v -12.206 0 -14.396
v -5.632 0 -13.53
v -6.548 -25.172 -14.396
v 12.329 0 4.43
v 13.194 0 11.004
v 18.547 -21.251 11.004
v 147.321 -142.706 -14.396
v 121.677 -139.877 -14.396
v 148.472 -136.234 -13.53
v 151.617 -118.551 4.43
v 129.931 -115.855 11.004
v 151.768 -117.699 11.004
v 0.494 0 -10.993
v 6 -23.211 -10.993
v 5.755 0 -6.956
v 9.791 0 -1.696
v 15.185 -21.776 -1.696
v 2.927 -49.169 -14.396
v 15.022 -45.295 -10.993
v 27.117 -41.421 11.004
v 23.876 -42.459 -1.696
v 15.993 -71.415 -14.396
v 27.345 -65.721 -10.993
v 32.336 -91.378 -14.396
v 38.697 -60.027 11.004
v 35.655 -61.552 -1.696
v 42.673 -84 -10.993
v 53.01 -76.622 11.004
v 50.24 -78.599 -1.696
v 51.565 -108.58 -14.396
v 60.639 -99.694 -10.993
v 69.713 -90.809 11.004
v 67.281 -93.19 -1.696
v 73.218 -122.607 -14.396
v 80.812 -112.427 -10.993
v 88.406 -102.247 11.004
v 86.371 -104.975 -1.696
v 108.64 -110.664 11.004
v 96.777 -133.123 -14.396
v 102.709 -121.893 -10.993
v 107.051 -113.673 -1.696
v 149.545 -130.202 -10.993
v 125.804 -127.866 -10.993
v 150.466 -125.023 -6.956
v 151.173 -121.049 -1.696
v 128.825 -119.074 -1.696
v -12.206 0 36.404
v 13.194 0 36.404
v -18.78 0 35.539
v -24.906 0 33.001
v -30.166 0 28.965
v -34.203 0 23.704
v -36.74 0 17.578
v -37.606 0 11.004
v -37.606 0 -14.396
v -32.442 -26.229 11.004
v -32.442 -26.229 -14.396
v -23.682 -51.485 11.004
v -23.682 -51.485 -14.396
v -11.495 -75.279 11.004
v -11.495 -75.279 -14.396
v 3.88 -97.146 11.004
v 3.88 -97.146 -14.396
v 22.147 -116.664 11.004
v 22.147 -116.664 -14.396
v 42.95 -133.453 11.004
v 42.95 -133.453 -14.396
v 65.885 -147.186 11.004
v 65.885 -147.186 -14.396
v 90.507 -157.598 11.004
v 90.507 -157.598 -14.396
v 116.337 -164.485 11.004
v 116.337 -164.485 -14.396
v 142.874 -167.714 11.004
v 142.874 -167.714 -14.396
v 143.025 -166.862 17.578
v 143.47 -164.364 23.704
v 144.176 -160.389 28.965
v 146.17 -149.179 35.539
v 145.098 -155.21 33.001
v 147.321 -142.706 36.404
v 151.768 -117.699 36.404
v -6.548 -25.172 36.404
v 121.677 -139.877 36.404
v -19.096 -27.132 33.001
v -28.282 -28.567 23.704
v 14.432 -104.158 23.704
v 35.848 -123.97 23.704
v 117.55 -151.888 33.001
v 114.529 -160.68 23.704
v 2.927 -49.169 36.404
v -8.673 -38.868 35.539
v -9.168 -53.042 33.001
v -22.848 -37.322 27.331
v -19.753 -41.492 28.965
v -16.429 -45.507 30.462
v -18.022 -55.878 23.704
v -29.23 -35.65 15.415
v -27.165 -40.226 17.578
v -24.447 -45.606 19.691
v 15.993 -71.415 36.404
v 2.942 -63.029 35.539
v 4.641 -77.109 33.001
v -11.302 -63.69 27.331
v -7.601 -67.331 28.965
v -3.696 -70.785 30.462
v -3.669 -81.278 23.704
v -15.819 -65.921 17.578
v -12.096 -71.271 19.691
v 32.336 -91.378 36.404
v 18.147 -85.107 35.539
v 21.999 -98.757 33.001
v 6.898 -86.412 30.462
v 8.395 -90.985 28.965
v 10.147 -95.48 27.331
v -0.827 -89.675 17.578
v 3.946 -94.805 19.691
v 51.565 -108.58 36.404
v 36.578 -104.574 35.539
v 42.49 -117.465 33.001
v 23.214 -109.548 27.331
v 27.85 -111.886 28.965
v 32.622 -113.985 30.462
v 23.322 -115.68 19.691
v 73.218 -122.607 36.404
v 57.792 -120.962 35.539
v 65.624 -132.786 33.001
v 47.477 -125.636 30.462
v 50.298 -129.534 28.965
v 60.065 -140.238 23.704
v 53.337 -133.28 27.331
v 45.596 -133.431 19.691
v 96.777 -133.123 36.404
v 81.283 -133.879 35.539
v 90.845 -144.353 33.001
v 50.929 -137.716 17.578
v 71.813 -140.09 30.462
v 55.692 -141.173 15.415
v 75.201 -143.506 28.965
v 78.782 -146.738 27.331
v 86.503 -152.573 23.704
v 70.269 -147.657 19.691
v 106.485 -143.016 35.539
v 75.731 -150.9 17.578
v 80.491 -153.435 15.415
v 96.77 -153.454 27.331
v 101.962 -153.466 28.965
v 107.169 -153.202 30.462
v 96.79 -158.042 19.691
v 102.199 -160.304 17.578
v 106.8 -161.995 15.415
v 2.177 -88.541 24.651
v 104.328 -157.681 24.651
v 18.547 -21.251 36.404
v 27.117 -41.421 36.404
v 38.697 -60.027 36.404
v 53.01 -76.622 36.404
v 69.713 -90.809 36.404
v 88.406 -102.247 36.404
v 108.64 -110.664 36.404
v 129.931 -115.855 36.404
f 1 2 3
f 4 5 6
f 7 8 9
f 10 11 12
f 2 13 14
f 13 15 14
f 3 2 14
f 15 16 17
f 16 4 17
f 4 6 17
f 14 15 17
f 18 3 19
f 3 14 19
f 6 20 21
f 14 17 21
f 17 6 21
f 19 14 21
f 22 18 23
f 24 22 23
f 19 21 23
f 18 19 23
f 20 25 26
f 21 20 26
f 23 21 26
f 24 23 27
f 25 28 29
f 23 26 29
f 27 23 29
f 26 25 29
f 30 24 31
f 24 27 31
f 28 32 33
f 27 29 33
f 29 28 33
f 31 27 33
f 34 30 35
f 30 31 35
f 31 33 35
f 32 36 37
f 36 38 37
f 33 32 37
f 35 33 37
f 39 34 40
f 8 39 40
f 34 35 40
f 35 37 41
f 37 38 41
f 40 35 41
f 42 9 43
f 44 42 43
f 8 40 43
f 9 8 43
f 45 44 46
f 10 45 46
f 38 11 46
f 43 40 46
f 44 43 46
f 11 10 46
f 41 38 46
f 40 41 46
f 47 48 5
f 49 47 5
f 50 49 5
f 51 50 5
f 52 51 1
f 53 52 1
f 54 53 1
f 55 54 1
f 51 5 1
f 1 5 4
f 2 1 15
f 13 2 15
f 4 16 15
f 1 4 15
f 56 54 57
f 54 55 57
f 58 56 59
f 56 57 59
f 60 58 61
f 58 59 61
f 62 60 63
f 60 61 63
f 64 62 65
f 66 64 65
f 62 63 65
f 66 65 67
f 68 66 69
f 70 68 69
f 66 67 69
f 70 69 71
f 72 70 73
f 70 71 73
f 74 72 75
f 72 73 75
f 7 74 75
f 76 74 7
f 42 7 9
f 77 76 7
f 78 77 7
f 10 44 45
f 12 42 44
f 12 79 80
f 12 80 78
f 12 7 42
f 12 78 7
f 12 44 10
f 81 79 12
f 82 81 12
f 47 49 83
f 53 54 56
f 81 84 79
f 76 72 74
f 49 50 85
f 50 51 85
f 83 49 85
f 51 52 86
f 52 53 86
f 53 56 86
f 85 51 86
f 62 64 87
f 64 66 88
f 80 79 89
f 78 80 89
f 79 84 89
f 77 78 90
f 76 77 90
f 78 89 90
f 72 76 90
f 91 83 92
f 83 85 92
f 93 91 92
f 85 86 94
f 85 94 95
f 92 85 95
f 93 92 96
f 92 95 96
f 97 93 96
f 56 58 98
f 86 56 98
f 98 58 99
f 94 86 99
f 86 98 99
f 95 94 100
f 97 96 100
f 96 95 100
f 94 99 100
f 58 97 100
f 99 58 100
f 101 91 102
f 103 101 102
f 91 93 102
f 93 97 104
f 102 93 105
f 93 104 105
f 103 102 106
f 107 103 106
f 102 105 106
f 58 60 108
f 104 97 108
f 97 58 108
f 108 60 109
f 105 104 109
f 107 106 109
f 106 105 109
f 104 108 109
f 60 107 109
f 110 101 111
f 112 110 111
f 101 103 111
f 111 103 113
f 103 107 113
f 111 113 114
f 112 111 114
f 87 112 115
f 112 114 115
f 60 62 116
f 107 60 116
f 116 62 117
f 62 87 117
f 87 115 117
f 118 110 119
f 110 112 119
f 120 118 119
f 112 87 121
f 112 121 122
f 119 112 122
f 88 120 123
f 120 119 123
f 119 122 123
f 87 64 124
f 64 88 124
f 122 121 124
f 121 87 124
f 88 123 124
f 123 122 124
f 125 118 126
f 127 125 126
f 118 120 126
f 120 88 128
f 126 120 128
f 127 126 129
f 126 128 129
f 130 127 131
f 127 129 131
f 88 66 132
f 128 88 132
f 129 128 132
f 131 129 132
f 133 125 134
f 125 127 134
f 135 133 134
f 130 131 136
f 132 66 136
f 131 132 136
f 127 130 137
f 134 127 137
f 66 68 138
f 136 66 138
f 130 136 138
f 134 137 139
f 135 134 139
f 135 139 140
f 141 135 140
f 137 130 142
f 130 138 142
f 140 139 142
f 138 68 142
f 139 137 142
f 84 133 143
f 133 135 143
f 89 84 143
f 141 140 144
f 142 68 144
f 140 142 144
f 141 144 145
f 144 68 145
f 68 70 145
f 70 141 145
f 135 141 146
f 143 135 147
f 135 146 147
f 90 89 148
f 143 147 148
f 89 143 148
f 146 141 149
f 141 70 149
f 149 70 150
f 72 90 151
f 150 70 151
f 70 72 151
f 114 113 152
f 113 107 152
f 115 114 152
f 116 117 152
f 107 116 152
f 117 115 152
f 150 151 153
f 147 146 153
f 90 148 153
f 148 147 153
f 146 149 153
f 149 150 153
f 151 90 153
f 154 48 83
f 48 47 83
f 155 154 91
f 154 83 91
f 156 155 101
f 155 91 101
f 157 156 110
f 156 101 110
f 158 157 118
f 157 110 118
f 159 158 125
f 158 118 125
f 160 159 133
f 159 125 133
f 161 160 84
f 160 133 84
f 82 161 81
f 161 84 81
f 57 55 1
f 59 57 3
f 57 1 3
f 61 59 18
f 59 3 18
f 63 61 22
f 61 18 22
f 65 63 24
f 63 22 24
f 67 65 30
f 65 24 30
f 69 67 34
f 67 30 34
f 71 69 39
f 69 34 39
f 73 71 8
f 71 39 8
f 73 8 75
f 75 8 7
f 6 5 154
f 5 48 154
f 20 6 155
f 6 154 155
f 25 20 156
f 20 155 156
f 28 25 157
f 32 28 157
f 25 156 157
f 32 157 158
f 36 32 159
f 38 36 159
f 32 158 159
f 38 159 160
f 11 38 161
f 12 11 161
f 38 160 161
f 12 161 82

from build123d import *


with BuildPart() as f2:
    # F2: sweep along a path in F1
    with BuildLine(Plane.XY) as f2_path:
        ThreePointArc((0, 0), (50.97265, -92.512826), (149.458185, -130.689174))
    # F0 (on Front) → F2 (sweep)
    with BuildSketch(Plane.XZ):
        with BuildLine():
            Line((-37.605679, -14.395924), (-12.205679, -14.395924))
            ThreePointArc((-12.205679, -14.395924), (5.754834, -6.956437), (13.194321, 11.004076))
            Line((13.194321, 11.004076), (13.194321, 36.404076))
            Line((13.194321, 36.404076), (-12.205679, 36.404076))
            ThreePointArc((-12.205679, 36.404076), (-30.166191, 28.964588), (-37.605679, 11.004076))
            Line((-37.605679, 11.004076), (-37.605679, -14.395924))
        make_face()
    sweep(path=f2_path.line)


solid = f2.part
